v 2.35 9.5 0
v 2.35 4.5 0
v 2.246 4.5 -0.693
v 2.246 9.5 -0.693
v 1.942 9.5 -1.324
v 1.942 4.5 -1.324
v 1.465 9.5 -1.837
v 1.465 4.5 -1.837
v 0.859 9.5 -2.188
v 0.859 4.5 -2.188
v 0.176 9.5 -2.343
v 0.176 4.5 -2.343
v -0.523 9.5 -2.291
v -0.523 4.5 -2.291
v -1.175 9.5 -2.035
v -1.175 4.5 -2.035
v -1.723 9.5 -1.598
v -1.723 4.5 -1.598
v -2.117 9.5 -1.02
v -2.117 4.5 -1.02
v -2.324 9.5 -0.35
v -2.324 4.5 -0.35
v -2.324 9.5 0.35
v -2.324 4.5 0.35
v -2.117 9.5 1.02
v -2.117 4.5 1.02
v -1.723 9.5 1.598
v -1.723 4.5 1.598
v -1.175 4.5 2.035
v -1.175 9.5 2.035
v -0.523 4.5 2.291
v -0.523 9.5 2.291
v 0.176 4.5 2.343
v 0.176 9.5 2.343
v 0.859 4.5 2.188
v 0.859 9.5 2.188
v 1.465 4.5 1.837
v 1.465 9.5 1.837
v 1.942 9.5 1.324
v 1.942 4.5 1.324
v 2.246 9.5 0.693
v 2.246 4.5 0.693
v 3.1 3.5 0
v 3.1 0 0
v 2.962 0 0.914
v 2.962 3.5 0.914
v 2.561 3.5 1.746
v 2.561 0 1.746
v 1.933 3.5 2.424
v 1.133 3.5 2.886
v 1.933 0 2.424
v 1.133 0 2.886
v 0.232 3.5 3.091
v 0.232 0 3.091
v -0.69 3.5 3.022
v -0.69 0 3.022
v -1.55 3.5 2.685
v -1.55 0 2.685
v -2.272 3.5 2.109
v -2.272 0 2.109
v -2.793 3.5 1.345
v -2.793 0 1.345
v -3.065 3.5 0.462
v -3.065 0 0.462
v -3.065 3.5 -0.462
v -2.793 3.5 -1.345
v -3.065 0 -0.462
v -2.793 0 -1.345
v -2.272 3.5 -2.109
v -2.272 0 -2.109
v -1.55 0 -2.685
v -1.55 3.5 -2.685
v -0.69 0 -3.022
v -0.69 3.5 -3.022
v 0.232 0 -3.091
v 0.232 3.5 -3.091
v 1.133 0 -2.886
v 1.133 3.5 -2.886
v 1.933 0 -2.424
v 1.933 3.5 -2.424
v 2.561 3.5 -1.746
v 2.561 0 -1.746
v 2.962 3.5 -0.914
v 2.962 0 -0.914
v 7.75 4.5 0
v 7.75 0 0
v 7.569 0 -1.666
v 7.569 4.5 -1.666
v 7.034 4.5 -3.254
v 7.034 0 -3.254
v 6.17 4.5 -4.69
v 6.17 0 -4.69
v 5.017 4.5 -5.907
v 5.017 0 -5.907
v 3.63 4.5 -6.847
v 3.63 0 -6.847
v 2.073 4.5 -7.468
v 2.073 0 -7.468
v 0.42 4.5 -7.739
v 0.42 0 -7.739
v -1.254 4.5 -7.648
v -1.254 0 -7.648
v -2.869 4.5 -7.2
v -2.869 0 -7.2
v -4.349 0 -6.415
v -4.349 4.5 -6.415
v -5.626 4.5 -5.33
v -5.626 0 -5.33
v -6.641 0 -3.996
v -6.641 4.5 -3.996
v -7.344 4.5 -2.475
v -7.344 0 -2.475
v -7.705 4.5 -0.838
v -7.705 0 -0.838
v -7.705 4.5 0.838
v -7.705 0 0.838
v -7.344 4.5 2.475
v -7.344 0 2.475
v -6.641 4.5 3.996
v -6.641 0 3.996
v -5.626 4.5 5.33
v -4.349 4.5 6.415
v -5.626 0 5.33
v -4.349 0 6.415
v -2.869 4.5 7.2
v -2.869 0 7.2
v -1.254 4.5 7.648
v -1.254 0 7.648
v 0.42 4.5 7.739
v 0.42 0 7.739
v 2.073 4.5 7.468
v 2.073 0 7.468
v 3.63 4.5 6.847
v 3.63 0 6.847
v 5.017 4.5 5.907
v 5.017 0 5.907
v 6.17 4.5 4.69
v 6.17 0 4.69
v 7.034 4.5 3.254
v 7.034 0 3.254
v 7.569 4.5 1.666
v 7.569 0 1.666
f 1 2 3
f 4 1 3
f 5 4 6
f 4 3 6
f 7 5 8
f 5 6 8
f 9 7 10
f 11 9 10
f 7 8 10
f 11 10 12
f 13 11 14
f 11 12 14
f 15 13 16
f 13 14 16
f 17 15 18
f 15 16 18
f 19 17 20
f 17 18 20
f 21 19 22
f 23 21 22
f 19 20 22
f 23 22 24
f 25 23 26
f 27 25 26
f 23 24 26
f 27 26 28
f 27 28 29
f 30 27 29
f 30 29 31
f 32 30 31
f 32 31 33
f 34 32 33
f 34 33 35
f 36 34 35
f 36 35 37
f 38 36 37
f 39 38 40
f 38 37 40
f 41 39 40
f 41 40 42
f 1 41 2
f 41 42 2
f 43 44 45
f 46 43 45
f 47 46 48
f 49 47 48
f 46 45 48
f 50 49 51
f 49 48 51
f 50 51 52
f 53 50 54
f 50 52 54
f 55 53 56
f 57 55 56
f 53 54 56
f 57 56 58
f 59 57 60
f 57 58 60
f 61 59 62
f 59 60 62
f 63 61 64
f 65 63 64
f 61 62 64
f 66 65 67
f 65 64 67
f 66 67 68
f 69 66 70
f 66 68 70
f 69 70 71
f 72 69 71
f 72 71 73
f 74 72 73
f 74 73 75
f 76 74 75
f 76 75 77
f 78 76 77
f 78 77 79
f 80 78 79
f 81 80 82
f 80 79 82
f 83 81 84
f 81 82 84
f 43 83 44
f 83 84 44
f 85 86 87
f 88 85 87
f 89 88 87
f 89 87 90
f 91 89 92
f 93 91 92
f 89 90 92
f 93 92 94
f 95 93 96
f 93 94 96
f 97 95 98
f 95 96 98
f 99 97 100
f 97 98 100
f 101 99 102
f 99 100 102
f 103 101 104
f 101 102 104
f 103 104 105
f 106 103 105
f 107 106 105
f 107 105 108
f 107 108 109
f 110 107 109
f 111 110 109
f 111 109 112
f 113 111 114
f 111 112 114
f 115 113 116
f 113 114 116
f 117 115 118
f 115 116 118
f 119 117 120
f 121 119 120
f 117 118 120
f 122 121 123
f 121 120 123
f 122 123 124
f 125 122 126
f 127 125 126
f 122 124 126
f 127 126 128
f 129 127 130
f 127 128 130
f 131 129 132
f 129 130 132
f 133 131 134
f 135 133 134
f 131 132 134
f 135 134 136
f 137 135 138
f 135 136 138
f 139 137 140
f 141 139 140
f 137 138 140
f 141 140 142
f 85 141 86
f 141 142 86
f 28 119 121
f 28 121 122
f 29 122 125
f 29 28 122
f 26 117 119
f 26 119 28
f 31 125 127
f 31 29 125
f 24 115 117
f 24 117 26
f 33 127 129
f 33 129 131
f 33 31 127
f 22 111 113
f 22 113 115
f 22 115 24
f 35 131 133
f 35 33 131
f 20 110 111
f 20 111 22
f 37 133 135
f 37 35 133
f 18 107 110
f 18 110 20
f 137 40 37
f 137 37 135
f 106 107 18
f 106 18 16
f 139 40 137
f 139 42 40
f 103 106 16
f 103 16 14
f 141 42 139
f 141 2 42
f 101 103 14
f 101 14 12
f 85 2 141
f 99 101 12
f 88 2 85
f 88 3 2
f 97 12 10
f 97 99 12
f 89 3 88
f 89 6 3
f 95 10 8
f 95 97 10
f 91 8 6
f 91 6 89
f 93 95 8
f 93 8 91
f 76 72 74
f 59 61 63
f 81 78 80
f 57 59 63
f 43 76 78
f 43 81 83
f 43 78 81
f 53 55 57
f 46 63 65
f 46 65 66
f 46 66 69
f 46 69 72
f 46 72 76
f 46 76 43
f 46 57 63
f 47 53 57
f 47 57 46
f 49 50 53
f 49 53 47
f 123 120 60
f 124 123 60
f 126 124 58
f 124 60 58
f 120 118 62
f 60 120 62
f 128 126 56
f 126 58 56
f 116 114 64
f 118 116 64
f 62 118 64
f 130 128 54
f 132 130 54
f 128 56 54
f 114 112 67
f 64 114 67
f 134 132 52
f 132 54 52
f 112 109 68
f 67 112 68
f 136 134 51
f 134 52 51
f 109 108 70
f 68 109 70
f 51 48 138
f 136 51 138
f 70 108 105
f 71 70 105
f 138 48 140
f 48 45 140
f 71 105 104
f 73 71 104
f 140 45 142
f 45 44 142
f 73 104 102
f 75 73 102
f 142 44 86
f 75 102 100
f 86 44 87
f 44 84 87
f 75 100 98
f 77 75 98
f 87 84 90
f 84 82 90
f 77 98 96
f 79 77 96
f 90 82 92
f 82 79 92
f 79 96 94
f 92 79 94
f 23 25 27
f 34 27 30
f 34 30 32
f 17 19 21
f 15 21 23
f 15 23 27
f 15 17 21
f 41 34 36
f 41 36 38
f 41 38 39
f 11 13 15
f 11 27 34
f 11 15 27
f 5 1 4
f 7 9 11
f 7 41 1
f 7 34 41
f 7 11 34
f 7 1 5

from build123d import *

# Parameters (mm, degrees)
IZIM1_R                     = 7.75
Y_KSEKLIK_EKSTR_ZYON1_DEPTH = 4.5
IZIM2_R                     = 2.35
Y_KSEKLIK_EKSTR_ZYON2_DEPTH = 5
IZIM3_R                     = 3.1
KES_EKSTR_ZYON1_DEPTH       = 3.5


with BuildPart() as part:
    # Çizim1 → Yükseklik-Ekstrüzyon1 (new body)
    with BuildSketch(Plane(origin=(0, 0, 0), x_dir=(1, 0, 0), z_dir=(0, 1, 0))):
        Circle(IZIM1_R)
    extrude(amount=Y_KSEKLIK_EKSTR_ZYON1_DEPTH)

    # Çizim2 → Yükseklik-Ekstrüzyon2 (add)
    with BuildSketch(Plane(origin=(0, 4.5, 0), x_dir=(1, 0, 0), z_dir=(0, 1, 0))):
        Circle(IZIM2_R)
    extrude(amount=Y_KSEKLIK_EKSTR_ZYON2_DEPTH)

    # Çizim3 → Kes-Ekstrüzyon1 (cut)
    with BuildSketch(Plane.XZ):
        Circle(IZIM3_R)
    extrude(amount=-KES_EKSTR_ZYON1_DEPTH, mode=Mode.SUBTRACT)


solid = part.part
